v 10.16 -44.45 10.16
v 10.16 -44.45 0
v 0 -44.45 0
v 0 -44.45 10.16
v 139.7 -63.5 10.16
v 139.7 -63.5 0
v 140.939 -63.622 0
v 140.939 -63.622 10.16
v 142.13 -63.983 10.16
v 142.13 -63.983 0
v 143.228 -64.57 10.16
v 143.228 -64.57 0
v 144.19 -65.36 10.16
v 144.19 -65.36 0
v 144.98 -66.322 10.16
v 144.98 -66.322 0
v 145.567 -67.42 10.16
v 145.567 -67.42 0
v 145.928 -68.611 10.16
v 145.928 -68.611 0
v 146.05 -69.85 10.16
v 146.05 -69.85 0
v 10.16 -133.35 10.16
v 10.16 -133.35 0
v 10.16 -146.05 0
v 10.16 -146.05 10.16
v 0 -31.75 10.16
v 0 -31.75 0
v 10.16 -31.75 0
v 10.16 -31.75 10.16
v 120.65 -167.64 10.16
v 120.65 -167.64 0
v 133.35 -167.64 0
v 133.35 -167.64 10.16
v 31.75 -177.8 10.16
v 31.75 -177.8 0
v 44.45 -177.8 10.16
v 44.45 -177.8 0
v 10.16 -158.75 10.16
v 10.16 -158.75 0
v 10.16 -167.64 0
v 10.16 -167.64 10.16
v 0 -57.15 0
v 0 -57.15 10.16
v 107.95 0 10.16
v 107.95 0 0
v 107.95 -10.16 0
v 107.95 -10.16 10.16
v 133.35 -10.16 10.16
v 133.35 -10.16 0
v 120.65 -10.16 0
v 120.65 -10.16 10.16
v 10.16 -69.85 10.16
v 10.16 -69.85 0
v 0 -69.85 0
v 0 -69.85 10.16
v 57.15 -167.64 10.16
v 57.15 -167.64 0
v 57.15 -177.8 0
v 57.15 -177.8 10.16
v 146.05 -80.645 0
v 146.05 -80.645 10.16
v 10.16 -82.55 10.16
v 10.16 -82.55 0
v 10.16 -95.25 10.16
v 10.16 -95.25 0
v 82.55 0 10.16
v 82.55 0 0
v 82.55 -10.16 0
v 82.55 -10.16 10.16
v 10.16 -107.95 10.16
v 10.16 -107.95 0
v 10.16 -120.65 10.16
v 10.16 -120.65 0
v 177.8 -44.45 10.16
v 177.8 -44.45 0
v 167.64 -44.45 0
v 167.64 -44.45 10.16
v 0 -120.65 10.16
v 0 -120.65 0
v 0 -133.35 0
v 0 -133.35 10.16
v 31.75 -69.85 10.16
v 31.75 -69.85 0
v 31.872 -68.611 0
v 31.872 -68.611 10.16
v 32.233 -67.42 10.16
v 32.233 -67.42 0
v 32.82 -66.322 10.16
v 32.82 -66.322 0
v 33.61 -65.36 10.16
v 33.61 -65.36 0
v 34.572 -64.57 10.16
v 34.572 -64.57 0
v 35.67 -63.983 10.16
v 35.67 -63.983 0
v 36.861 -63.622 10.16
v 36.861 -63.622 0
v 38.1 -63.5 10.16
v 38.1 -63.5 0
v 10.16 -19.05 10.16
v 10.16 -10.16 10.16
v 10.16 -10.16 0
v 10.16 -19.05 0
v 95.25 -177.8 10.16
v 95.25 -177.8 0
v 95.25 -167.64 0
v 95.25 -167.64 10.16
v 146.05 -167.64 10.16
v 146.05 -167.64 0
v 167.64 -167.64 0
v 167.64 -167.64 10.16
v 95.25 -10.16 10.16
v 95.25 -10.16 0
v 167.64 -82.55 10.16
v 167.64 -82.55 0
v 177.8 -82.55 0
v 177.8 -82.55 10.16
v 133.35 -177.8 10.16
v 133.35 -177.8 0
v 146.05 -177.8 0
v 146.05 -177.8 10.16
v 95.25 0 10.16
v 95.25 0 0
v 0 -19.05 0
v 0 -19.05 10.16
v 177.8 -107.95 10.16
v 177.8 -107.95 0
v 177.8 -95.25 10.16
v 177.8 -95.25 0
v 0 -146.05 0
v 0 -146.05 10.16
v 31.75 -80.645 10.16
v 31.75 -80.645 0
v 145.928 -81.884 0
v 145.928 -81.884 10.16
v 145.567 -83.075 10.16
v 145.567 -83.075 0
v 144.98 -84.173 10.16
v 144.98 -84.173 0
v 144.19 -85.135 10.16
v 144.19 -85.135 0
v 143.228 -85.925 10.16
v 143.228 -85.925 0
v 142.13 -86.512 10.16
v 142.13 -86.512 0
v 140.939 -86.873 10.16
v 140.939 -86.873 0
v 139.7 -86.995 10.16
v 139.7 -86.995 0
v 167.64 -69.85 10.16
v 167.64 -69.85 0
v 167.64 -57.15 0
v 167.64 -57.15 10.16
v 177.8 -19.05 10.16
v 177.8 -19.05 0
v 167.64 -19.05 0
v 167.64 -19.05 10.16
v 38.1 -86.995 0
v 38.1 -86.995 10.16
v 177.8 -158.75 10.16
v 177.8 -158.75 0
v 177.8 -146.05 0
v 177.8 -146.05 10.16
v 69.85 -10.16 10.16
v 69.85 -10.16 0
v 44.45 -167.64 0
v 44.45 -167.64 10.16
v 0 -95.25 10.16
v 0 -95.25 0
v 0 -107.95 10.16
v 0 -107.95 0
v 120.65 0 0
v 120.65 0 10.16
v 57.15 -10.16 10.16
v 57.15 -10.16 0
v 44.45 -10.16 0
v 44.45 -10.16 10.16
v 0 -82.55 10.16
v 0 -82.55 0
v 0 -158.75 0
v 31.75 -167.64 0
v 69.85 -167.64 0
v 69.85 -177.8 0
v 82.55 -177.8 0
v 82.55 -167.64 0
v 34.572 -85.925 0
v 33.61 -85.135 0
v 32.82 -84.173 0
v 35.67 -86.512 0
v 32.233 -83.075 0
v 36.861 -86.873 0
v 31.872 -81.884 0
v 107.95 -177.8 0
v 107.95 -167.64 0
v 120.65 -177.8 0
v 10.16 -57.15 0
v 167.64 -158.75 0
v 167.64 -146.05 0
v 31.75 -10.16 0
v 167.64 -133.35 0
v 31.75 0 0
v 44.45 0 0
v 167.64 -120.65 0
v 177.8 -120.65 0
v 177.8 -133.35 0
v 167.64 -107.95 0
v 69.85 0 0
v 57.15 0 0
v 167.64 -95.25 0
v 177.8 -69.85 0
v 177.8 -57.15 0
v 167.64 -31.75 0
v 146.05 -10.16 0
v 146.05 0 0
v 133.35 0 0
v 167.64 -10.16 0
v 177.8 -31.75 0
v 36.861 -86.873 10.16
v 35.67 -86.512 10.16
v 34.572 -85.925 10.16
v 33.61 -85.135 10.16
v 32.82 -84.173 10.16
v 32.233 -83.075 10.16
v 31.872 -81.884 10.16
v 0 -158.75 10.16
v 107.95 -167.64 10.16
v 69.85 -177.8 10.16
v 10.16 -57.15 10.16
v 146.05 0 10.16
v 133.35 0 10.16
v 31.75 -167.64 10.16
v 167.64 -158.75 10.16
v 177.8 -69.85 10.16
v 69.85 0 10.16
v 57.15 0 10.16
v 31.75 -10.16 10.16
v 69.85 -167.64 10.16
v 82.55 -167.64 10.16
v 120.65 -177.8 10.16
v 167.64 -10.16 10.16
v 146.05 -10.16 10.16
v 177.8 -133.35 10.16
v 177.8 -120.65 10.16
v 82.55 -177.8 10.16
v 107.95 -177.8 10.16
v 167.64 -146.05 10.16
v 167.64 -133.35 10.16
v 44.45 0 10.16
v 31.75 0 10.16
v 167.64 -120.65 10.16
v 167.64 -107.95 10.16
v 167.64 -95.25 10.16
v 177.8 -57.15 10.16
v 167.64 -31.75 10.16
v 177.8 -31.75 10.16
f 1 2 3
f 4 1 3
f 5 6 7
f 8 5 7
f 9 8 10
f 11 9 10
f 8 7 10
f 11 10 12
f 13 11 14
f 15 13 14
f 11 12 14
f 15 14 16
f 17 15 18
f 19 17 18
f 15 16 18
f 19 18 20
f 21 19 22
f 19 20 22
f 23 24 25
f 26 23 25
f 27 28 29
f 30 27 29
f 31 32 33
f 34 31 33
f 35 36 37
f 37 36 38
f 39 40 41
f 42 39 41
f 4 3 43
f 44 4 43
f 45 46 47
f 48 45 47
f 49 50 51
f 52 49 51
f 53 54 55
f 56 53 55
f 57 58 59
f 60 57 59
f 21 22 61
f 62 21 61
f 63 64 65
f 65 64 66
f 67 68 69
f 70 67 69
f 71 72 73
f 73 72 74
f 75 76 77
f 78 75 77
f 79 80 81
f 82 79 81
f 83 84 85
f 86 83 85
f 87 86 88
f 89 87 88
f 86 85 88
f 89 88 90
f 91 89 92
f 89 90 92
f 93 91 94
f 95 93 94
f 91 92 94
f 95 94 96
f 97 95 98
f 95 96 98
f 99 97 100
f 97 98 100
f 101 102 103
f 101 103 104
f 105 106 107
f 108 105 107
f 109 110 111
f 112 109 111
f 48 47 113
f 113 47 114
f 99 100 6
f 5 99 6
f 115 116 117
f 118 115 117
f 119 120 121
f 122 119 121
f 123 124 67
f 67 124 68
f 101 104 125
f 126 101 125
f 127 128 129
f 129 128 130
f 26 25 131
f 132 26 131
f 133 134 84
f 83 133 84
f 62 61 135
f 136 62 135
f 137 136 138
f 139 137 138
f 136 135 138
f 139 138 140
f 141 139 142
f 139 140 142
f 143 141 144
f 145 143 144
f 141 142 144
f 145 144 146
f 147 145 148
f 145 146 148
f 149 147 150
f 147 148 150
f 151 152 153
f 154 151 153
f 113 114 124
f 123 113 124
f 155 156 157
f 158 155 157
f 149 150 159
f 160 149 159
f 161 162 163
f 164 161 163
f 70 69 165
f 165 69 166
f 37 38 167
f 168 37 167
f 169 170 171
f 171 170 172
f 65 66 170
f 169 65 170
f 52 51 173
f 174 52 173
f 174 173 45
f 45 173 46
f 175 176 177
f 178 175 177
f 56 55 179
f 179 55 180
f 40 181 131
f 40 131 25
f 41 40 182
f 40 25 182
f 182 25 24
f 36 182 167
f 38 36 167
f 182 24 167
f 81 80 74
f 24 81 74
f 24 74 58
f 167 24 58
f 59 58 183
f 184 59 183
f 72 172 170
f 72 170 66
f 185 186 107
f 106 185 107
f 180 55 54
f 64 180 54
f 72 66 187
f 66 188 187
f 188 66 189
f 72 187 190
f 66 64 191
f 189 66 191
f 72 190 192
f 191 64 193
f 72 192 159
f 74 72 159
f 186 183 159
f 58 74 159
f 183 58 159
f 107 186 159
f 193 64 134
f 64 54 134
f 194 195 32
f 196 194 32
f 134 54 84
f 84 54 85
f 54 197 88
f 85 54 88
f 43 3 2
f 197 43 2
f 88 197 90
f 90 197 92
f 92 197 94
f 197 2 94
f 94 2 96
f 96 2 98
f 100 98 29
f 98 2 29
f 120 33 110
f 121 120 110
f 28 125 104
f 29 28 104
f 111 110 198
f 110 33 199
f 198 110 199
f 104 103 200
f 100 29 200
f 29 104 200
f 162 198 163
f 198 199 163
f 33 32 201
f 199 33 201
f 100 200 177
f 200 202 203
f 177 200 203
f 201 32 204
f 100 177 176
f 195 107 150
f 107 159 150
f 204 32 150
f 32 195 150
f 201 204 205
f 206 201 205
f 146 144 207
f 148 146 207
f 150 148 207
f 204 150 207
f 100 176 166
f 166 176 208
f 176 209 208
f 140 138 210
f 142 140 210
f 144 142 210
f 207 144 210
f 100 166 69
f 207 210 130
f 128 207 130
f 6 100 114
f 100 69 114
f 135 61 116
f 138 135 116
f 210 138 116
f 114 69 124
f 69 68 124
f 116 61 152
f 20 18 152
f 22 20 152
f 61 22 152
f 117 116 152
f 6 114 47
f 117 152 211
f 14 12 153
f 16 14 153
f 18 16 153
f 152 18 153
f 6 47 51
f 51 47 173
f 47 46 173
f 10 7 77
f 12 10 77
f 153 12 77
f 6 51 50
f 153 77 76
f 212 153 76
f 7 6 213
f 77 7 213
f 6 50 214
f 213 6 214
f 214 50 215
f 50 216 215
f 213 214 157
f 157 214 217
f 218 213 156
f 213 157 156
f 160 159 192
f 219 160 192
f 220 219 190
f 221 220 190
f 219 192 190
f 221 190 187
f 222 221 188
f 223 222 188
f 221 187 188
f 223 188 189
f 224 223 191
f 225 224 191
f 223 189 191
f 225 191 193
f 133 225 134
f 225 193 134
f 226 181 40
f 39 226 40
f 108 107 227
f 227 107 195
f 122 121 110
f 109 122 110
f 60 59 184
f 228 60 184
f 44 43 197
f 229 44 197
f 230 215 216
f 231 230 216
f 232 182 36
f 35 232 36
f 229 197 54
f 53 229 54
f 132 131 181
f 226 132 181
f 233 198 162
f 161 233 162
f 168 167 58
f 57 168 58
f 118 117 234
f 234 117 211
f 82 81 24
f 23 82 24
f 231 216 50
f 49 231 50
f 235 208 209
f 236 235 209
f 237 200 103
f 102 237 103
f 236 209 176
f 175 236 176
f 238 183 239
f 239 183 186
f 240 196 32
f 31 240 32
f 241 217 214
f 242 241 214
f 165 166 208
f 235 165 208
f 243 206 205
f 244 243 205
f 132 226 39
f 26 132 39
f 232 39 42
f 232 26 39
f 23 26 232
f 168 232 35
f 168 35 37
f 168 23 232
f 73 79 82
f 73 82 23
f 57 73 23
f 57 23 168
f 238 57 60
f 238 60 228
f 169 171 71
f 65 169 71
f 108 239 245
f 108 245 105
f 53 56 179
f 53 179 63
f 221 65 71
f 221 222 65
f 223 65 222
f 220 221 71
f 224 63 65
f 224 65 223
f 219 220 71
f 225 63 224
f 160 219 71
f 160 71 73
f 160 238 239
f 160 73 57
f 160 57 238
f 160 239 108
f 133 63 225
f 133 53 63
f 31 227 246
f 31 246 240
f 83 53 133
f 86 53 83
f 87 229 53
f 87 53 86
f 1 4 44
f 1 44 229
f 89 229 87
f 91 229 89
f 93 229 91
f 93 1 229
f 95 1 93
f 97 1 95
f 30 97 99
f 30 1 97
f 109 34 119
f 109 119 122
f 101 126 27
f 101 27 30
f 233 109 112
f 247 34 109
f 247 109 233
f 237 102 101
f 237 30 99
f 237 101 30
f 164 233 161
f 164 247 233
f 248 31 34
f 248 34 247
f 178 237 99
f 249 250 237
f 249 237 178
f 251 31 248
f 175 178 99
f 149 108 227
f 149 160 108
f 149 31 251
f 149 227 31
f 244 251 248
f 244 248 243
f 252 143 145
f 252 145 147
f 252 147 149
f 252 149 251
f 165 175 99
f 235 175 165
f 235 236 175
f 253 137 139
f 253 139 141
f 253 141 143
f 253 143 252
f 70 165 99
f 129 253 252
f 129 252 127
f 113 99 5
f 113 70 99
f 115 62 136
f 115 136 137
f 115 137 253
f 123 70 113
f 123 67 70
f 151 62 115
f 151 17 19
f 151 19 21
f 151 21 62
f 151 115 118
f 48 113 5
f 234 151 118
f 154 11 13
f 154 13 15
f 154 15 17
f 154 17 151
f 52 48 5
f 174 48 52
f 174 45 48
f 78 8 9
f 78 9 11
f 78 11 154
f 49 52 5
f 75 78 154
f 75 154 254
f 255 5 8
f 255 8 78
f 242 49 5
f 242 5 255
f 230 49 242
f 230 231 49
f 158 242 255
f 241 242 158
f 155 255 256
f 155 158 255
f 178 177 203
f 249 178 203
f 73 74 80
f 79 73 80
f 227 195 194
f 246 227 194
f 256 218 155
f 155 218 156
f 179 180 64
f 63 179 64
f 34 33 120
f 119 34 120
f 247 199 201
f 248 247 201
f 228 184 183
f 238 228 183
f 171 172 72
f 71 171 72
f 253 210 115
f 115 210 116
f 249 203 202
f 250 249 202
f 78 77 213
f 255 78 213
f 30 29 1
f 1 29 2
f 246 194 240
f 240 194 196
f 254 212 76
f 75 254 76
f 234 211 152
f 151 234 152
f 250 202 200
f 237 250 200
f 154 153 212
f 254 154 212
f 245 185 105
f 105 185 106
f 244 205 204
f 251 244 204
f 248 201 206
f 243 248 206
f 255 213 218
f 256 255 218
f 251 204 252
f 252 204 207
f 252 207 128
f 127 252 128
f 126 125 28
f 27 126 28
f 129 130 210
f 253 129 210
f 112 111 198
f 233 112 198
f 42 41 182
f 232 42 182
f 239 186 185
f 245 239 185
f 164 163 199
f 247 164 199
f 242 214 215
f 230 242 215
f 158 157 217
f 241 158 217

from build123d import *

# Parameters (mm, degrees)
F1_DEPTH = 10.16


with BuildPart() as f1:
    # F0 (on Top) → F1 (new body)
    with BuildSketch(Plane.XY):
        Polygon((44.45, 0), (31.75, 0), (31.75, -10.16), (10.16, -10.16), (10.16, -19.05), (0, -19.05), (0, -31.75), (10.16, -31.75), (10.16, -44.45), (0, -44.45), (0, -57.15), (10.16, -57.15), (10.16, -69.85), (0, -69.85), (0, -82.55), (10.16, -82.55), (10.16, -95.25), (0, -95.25), (0, -107.95), (10.16, -107.95), (10.16, -120.65), (0, -120.65), (0, -133.35), (10.16, -133.35), (10.16, -146.05), (0, -146.05), (0, -158.75), (10.16, -158.75), (10.16, -167.64), (31.75, -167.64), (31.75, -177.8), (44.45, -177.8), (44.45, -167.64), (57.15, -167.64), (57.15, -177.8), (69.85, -177.8), (69.85, -167.64), (82.55, -167.64), (82.55, -177.8), (95.25, -177.8), (95.25, -167.64), (107.95, -167.64), (107.95, -177.8), (120.65, -177.8), (120.65, -167.64), (133.35, -167.64), (133.35, -177.8), (146.05, -177.8), (146.05, -167.64), (167.64, -167.64), (167.64, -158.75), (177.8, -158.75), (177.8, -146.05), (167.64, -146.05), (167.64, -133.35), (177.8, -133.35), (177.8, -120.65), (167.64, -120.65), (167.64, -107.95), (177.8, -107.95), (177.8, -95.25), (167.64, -95.25), (167.64, -82.55), (177.8, -82.55), (177.8, -69.85), (167.64, -69.85), (167.64, -57.15), (177.8, -57.15), (177.8, -44.45), (167.64, -44.45), (167.64, -31.75), (177.8, -31.75), (177.8, -19.05), (167.64, -19.05), (167.64, -10.16), (146.05, -10.16), (146.05, 0), (133.35, 0), (133.35, -10.16), (120.65, -10.16), (120.65, 0), (107.95, 0), (107.95, -10.16), (95.25, -10.16), (95.25, 0), (82.55, 0), (82.55, -10.16), (69.85, -10.16), (69.85, 0), (57.15, 0), (57.15, -10.16), (44.45, -10.16), align=None)
        with BuildLine():
            ThreePointArc((31.75, -69.85), (33.609872, -65.359872), (38.1, -63.5))
            Line((38.1, -63.5), (139.7, -63.5))
            ThreePointArc((139.7, -63.5), (144.190128, -65.359872), (146.05, -69.85))
            Line((146.05, -69.85), (146.05, -80.645))
            ThreePointArc((146.05, -80.645), (144.190128, -85.135128), (139.7, -86.995))
            Line((139.7, -86.995), (38.1, -86.995))
            ThreePointArc((38.1, -86.995), (33.609872, -85.135128), (31.75, -80.645))
            Line((31.75, -80.645), (31.75, -69.85))
        make_face(mode=Mode.SUBTRACT)
    extrude(amount=F1_DEPTH)


solid = f1.part
